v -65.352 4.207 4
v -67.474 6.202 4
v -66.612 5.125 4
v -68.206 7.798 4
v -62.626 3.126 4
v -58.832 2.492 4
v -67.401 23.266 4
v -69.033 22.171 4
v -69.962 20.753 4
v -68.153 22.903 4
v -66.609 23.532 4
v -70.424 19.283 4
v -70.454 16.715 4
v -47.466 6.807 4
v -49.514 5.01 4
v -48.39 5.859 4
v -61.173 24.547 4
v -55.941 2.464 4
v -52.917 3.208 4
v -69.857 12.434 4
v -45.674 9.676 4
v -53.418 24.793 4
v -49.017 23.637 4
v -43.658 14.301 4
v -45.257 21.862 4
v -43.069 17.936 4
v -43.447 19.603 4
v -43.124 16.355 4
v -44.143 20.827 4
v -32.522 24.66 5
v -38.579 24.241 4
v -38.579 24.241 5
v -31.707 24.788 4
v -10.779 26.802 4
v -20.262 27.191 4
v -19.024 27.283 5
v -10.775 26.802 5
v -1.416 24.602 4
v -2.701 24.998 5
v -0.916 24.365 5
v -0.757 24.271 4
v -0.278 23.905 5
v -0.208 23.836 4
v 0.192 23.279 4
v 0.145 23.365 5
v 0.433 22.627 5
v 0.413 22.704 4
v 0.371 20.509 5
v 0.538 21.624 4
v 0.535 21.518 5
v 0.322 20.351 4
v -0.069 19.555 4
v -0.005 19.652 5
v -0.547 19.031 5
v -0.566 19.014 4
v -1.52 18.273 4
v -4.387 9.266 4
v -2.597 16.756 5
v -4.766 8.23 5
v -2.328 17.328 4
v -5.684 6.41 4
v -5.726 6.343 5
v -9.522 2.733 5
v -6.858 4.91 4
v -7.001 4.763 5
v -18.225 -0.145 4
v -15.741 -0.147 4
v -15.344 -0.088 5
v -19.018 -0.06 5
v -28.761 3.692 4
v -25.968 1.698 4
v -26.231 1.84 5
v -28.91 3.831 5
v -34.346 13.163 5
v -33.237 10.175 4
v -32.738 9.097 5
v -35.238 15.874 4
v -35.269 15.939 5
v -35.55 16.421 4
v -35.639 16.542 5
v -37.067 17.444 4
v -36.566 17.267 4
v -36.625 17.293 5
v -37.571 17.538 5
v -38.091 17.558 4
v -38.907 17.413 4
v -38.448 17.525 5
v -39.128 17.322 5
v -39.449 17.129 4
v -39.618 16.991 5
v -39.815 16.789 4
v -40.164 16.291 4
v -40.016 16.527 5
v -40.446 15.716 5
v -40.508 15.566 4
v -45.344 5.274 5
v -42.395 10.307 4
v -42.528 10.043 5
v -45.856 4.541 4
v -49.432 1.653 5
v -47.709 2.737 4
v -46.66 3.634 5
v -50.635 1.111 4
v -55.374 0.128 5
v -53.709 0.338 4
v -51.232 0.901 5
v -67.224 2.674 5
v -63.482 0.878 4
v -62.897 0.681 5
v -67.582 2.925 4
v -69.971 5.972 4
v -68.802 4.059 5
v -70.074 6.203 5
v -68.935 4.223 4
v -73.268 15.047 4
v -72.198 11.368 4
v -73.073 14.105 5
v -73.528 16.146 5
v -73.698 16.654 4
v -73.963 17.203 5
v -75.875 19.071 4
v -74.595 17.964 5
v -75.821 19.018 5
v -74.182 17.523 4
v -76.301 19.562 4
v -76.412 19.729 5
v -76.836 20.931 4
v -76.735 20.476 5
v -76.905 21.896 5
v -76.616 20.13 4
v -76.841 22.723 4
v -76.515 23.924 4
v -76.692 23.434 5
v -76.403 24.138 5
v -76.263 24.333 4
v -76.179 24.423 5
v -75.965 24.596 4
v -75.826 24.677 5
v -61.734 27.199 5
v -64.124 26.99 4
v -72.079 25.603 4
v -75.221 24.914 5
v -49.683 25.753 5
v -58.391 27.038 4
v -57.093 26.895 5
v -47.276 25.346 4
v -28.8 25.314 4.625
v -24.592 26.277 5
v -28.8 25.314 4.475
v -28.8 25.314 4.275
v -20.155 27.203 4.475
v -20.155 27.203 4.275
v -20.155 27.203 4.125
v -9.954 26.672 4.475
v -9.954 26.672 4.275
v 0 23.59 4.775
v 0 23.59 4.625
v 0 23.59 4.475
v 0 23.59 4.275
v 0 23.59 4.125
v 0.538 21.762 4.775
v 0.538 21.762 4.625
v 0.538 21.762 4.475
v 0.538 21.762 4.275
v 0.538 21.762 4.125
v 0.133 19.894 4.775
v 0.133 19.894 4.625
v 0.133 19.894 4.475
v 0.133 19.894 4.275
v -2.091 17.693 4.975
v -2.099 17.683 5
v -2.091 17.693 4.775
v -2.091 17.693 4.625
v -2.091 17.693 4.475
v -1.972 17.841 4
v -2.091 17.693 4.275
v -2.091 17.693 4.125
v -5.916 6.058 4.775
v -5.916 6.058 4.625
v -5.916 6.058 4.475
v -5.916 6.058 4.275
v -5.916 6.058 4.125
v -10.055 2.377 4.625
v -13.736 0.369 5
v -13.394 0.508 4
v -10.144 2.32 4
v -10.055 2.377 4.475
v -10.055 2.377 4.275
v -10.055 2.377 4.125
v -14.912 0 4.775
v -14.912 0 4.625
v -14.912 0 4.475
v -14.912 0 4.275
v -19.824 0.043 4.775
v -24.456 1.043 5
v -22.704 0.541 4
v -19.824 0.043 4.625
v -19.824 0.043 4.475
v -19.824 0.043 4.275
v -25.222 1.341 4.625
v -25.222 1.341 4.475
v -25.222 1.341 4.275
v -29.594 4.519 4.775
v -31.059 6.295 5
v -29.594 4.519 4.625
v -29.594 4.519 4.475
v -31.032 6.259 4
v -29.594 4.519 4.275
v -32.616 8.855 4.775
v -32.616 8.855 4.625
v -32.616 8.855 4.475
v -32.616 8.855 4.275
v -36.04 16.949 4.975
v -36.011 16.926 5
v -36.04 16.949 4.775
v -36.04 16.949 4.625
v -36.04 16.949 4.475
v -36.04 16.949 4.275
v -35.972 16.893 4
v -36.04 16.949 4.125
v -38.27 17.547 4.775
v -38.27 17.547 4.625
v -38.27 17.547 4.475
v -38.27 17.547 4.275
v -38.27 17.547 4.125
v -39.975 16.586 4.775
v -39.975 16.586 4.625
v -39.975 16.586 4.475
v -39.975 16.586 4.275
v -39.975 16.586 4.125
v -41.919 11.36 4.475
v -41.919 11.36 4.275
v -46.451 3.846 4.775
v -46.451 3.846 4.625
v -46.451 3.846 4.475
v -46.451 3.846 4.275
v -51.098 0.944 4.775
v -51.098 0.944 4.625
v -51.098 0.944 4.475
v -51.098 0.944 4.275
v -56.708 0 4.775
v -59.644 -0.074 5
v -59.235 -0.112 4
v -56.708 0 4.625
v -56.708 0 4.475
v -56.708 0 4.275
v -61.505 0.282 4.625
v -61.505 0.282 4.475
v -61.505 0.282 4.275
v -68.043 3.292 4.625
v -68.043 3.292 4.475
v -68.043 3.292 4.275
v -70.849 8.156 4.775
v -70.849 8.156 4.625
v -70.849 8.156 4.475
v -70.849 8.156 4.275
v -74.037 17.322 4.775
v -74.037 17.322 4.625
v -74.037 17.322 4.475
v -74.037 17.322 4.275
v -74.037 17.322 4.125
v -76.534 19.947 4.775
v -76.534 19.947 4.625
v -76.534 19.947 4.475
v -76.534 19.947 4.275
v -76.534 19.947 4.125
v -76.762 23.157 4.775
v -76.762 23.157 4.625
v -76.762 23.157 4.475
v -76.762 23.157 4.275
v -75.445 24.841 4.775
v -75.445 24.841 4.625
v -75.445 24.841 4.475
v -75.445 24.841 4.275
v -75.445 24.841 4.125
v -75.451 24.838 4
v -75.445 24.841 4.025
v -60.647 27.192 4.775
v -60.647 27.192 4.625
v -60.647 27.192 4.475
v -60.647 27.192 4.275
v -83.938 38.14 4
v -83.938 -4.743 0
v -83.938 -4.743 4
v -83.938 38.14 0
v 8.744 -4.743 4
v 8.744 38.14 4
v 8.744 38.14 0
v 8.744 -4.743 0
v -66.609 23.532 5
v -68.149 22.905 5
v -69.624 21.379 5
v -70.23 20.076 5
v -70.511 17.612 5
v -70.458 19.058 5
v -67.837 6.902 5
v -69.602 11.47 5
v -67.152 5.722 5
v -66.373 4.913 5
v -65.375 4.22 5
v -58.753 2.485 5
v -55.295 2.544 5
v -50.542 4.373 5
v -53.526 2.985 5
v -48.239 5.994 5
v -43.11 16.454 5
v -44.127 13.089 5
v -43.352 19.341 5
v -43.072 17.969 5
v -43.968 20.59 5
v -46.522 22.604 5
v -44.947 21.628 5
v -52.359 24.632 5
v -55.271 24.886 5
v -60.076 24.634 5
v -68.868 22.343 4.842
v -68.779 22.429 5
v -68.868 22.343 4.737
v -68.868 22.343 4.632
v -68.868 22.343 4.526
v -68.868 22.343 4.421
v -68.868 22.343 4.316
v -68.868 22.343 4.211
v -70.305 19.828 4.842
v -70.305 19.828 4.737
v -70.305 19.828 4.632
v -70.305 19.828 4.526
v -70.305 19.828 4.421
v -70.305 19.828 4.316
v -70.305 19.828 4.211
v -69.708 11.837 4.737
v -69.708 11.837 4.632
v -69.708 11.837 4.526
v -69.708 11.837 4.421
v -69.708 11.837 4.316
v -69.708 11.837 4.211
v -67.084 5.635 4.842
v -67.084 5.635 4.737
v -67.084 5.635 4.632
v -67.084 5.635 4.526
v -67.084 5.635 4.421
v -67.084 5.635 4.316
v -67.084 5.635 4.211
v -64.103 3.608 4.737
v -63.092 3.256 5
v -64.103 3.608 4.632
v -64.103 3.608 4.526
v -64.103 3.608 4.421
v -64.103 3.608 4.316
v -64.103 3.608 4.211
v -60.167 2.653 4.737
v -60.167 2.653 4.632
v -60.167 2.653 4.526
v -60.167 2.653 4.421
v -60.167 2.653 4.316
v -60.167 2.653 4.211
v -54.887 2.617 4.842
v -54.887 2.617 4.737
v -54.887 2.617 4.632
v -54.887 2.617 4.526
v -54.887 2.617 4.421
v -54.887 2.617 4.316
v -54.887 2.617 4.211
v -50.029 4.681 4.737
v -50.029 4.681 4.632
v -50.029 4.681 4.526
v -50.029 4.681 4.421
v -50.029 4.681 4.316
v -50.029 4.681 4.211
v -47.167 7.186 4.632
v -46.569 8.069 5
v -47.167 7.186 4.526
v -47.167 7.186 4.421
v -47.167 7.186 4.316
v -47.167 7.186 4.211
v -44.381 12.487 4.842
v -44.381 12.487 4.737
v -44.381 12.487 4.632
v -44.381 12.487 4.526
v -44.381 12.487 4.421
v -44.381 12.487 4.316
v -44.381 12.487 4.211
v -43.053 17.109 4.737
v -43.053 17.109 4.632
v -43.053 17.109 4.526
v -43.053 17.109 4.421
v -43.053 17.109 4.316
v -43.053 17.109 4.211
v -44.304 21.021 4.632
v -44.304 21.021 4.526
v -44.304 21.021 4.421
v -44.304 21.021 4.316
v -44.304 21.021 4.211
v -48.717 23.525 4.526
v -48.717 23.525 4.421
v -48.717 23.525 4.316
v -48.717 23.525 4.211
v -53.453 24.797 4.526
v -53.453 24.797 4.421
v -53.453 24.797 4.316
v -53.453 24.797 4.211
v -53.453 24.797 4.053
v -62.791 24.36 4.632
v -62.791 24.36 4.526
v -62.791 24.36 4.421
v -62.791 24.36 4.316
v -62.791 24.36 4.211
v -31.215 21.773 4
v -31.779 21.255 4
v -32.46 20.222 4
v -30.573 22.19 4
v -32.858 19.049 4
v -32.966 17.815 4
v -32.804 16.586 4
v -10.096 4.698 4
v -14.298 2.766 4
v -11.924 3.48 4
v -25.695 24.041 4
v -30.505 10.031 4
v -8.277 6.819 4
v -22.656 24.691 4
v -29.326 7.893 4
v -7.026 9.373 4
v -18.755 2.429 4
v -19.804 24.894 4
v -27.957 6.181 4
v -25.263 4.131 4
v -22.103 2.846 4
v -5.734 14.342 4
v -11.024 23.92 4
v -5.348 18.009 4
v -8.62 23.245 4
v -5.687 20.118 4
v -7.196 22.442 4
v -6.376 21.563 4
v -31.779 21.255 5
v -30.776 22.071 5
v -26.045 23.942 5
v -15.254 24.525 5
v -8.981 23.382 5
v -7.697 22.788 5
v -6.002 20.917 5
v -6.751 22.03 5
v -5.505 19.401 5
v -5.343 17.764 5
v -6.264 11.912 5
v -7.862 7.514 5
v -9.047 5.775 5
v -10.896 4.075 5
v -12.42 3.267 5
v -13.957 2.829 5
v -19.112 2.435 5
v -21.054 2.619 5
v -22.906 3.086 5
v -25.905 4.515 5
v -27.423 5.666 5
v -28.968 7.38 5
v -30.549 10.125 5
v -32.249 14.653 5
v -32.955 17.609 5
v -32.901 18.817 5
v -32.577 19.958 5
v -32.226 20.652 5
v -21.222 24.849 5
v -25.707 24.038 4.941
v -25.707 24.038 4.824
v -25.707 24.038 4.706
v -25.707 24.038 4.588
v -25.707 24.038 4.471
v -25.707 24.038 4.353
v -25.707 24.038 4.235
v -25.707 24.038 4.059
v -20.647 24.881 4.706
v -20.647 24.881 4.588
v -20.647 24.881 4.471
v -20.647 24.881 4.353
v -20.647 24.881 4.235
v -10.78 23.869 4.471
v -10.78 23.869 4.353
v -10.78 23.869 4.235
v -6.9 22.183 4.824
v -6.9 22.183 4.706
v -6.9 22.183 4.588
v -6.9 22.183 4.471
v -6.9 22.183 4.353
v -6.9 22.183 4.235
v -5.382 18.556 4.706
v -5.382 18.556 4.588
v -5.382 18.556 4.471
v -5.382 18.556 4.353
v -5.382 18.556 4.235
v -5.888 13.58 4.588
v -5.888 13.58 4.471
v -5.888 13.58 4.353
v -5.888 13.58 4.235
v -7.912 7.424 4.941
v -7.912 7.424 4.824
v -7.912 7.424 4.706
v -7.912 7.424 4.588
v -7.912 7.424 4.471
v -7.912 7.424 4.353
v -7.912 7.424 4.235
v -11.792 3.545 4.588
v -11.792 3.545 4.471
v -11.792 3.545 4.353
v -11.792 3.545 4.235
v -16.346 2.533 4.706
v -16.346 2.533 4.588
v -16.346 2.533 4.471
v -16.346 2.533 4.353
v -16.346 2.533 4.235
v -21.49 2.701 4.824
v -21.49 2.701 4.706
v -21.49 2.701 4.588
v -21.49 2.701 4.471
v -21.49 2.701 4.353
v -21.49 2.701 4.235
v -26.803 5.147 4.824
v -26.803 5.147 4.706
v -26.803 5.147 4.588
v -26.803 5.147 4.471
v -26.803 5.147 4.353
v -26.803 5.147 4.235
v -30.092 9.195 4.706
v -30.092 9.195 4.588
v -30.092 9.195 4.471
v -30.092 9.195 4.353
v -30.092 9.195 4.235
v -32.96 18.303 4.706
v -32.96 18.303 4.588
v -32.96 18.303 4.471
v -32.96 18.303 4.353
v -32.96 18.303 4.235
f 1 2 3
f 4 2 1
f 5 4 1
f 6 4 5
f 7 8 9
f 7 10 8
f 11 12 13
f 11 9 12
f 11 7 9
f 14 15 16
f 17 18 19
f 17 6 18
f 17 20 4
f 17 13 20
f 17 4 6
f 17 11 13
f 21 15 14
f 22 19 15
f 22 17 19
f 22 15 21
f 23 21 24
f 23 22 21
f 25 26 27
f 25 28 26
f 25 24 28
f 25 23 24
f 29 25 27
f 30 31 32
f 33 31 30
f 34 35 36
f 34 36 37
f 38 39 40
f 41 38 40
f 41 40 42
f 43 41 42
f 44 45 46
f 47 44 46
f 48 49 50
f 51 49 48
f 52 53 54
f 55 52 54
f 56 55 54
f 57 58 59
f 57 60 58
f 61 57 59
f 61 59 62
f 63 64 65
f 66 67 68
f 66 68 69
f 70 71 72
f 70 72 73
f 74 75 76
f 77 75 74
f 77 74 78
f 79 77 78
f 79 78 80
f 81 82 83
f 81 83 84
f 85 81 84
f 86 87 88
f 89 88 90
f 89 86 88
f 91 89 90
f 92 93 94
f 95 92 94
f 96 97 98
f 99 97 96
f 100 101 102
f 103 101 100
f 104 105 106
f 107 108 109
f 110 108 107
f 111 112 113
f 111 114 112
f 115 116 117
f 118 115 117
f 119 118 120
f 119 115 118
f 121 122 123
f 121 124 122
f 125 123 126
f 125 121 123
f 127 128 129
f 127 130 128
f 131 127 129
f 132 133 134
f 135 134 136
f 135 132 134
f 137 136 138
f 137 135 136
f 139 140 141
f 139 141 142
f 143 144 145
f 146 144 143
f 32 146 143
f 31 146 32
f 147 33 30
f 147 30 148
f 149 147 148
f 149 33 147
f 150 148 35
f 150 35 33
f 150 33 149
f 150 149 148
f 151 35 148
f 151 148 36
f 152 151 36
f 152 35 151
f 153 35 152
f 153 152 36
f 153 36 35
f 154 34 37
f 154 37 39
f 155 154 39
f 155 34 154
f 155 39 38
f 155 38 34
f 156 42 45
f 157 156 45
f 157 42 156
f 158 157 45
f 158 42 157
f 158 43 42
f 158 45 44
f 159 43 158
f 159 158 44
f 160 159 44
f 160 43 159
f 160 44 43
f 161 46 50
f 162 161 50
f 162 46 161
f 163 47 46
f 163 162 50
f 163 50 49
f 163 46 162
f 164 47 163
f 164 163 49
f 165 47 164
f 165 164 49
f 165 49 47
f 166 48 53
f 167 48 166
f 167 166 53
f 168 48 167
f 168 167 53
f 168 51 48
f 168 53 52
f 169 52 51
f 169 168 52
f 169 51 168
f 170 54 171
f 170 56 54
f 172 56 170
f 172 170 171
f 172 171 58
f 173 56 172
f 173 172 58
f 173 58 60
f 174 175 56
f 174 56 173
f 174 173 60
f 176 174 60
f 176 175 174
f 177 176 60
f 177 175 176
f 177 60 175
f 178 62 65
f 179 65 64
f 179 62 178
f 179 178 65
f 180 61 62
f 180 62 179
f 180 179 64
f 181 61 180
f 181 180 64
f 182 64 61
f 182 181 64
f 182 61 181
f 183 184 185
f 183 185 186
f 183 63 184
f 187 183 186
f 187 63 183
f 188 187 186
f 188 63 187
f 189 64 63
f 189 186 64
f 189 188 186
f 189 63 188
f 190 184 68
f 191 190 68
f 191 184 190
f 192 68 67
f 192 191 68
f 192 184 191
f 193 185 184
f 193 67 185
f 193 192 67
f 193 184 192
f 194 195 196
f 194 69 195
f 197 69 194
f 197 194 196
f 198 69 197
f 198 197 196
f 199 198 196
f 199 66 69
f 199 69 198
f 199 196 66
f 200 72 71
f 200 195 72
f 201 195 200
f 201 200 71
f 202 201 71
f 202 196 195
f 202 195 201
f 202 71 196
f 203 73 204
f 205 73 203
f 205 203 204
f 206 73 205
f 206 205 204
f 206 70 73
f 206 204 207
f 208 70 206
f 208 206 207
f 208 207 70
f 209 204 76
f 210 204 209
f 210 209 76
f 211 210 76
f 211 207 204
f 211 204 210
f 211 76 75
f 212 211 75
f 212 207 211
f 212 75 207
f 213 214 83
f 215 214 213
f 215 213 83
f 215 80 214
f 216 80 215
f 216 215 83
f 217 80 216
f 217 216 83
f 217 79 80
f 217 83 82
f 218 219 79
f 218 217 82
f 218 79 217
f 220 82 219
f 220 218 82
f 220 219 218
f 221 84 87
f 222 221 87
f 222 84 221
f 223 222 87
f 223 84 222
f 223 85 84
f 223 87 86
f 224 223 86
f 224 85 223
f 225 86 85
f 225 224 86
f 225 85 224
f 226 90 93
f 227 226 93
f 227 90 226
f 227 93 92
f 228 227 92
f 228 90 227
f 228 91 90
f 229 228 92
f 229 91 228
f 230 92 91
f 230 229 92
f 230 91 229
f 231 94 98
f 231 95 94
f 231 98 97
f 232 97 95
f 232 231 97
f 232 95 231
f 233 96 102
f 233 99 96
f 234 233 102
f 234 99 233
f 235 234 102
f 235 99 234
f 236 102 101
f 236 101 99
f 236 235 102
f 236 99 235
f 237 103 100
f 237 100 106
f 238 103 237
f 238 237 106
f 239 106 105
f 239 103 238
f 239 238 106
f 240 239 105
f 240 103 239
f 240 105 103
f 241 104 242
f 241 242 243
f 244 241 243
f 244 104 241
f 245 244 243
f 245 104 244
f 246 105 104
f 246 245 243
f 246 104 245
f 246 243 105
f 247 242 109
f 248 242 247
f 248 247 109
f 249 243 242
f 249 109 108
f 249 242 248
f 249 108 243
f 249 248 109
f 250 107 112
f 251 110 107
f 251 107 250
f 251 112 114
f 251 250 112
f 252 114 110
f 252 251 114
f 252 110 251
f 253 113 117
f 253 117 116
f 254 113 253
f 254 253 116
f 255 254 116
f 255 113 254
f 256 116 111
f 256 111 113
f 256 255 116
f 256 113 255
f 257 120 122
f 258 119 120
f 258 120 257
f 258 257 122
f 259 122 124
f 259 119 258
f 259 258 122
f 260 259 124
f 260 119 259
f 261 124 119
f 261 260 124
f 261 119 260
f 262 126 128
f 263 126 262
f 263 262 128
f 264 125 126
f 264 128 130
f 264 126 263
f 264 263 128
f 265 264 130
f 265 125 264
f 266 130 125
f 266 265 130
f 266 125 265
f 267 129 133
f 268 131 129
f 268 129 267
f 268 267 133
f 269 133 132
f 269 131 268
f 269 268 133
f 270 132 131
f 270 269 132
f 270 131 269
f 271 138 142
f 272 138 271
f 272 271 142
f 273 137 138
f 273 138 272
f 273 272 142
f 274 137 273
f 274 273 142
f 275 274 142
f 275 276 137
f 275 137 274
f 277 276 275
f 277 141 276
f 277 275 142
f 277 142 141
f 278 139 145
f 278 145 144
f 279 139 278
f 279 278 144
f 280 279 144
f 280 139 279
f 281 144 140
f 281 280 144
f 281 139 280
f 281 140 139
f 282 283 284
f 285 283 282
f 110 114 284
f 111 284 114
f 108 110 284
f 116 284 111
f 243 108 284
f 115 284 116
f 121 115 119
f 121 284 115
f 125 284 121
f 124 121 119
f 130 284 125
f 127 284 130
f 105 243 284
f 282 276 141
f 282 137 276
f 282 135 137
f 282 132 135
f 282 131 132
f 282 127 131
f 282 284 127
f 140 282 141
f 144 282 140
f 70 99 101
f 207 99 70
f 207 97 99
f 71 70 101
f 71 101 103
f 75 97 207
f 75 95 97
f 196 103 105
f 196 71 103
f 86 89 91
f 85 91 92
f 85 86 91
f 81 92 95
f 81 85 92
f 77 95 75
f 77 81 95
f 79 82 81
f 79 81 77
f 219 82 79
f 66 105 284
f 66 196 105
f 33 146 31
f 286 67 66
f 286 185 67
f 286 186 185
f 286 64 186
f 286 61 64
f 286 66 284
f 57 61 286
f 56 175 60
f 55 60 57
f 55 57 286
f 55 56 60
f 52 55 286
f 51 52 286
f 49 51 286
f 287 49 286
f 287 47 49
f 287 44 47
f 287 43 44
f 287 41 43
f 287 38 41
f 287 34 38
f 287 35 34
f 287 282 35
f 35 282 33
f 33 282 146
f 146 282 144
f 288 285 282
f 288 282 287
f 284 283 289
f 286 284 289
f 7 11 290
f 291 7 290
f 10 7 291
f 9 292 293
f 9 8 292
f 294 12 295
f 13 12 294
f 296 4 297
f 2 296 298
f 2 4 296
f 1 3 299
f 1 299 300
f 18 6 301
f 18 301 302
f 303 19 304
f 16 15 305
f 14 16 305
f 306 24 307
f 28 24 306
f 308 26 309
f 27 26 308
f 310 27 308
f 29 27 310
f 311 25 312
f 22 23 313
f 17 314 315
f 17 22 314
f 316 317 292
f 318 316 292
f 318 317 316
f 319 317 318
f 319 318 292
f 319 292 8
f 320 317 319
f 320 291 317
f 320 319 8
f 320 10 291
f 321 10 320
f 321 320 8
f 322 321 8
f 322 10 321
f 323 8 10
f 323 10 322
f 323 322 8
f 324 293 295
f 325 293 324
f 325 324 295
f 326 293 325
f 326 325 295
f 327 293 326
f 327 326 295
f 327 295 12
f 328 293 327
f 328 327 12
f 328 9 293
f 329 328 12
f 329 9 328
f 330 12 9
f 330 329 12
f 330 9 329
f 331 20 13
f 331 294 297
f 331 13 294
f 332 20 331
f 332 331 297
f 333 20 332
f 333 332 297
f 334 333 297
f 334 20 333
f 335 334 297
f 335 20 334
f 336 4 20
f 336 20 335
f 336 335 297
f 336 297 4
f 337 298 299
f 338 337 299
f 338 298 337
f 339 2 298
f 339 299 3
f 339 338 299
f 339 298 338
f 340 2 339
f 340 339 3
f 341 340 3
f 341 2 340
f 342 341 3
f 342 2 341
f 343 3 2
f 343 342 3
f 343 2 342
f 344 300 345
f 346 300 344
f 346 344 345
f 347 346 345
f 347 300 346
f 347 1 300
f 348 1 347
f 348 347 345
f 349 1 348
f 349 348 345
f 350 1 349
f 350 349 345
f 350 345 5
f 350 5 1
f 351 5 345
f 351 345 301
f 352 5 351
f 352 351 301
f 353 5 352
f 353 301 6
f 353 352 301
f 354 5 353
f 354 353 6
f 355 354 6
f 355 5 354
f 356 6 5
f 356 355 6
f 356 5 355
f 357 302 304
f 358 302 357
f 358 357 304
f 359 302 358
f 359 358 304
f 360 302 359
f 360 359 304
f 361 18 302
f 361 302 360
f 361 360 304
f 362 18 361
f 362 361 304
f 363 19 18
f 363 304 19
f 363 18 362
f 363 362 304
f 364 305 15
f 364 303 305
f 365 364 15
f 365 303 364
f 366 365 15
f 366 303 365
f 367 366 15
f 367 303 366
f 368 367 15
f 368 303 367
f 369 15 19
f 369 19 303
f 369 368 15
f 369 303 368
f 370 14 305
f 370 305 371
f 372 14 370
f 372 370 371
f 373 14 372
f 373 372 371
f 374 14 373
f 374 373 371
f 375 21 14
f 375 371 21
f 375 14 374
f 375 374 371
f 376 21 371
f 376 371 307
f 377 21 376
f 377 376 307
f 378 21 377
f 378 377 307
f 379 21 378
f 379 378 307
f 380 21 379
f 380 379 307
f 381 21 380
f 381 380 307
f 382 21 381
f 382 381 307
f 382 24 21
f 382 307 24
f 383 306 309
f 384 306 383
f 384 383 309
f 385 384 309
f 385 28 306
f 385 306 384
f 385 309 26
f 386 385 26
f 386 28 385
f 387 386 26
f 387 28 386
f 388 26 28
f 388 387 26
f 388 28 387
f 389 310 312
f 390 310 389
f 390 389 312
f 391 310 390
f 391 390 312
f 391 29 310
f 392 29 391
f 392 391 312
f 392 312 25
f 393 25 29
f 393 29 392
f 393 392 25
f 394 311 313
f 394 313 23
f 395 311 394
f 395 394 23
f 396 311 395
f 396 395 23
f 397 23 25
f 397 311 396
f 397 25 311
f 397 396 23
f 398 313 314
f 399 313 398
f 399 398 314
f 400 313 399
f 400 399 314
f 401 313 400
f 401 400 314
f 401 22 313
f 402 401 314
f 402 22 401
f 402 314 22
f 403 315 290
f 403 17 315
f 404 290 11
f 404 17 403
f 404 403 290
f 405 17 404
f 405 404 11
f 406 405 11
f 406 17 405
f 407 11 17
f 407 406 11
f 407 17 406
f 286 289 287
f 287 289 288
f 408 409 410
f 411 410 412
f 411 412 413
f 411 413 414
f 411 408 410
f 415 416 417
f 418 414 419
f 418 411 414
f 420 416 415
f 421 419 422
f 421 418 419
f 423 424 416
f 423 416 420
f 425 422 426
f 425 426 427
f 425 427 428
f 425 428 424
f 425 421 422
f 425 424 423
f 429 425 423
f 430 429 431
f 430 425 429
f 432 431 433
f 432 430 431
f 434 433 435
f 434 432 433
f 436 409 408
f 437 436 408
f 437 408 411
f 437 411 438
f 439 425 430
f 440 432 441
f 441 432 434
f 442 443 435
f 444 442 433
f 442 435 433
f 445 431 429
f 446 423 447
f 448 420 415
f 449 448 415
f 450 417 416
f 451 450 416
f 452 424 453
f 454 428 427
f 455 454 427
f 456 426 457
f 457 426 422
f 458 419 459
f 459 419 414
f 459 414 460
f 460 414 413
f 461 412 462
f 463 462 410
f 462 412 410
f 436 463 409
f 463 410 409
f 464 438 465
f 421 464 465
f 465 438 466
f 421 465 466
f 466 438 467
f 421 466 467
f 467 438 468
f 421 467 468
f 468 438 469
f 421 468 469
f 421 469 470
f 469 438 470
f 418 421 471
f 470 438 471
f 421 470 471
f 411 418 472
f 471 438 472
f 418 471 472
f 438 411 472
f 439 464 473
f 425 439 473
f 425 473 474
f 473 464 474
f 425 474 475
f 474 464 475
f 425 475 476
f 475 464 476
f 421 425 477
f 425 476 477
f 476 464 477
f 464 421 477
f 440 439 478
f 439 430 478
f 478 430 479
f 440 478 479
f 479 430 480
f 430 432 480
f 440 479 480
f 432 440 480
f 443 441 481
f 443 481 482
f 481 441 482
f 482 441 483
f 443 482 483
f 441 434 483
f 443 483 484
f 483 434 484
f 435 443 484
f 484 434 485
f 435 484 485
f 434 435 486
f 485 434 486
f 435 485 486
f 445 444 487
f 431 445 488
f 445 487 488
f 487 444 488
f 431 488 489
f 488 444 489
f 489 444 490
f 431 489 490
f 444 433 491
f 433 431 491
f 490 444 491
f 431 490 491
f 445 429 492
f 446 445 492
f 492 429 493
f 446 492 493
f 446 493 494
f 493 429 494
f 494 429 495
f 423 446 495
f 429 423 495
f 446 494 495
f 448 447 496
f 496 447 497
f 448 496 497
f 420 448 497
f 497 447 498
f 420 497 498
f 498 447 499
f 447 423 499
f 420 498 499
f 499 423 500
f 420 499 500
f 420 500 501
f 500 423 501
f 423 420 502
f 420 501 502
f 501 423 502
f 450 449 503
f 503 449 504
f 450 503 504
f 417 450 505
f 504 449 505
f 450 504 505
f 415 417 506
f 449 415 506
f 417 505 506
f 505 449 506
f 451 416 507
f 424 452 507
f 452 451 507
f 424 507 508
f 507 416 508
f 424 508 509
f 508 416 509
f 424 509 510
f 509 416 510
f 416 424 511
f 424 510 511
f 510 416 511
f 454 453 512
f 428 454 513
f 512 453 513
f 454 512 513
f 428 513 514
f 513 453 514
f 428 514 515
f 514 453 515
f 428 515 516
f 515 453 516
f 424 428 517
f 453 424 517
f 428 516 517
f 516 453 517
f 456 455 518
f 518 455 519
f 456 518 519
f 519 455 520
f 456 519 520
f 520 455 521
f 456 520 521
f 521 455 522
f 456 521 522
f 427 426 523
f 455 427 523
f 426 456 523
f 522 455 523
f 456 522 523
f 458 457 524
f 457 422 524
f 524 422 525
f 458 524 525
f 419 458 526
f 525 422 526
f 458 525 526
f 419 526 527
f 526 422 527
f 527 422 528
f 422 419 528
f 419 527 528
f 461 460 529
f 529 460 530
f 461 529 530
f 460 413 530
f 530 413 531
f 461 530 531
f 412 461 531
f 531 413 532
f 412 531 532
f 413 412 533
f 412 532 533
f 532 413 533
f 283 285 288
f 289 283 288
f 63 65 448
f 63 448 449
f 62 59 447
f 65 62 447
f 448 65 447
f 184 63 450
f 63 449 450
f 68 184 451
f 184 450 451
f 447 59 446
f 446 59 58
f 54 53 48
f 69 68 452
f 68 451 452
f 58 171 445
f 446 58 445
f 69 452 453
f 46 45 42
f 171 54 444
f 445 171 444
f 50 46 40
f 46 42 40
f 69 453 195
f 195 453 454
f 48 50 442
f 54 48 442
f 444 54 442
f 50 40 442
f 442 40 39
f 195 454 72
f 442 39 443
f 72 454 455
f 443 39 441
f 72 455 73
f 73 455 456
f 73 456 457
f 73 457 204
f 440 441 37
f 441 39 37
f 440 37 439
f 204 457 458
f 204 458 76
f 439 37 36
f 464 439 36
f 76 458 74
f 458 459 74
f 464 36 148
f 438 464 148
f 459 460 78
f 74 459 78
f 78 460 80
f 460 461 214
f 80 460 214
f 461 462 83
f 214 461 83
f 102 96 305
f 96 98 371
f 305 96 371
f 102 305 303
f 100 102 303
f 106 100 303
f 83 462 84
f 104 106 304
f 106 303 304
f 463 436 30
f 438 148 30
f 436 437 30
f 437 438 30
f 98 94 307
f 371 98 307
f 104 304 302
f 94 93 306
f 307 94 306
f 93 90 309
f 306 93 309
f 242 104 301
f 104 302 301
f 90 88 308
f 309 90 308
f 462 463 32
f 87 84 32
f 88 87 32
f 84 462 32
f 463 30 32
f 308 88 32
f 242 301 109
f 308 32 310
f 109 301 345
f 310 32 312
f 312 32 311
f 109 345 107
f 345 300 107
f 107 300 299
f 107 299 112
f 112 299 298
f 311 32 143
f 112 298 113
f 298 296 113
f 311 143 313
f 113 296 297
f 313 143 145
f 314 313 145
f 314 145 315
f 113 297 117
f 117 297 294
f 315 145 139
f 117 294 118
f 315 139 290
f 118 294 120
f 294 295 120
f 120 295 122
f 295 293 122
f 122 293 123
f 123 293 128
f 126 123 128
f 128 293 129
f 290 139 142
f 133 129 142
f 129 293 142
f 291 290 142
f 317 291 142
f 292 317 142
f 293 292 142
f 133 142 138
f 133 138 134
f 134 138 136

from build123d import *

# Parameters (mm, degrees)
F1_DEPTH = 5
F2_W     = 92.6819341257
F2_H     = 42.8826878779
F3_DEPTH = 4


with BuildPart() as f1:
    # F0 (on Top) → F1 (new body)
    with BuildSketch(Plane.XY):
        with BuildLine():
            add(Edge.make_bspline(
                [(-38.5794527829, 24.2407601327), (-36.8938359657, 24.1646889377), (-34.0712271397, 24.3701397917), (-28.7449336503, 25.2725649481), (-24.6964236408, 26.233170797), (-20.0937351066, 27.4374504094), (-15.9388121782, 27.1907800467), (-9.7784106854, 26.9215230295), (-5.1572212989, 25.2878939395), (0.9454413275, 24.6197493885), (0.5284380254, 19.1125949977), (-2.7772947075, 18.1134582068), (-3.4772585982, 11.9771551568), (-5.3535759298, 5.7153961302), (-9.9969087832, 2.2895875239), (-14.8227365622, -0.4988788856), (-19.5141472301, -0.0528227384), (-25.434546306, 0.8846617395), (-29.8347389018, 4.3816497471), (-32.7929461918, 8.7179524801), (-34.5677049198, 13.5628935911), (-35.4518550311, 17.3758928026), (-39.0381090092, 17.8289636328), (-40.6751139591, 15.8870554399), (-41.6076919366, 11.1768105438), (-44.5948251246, 6.6107335821), (-46.2072444153, 3.6459383205), (-50.8057943554, 0.4598349112), (-56.8431956147, 0.0313466232), (-60.0548137757, -0.4130011603), (-69.0276406889, 2.5740187249), (-70.6345398481, 8.0783303504), (-73.2337788323, 13.2783723041), (-73.4712085199, 17.7973904612), (-77.2733596066, 19.3870364009), (-76.8231832018, 24.2080677076), (-75.0488474945, 25.1841828262), (-66.5877341579, 26.487686587), (-61.5692334882, 27.5991577961), (-52.5676144362, 26.2811993145), (-45.8588823668, 25.0671448707), (-40.6686330251, 24.3350439793), (-38.5794527829, 24.2407601327)],
                knots=[0, 0, 0, 0, 0.0241474843, 0.0498897382, 0.073155029, 0.0971827474, 0.1203224345, 0.1478351024, 0.1736566374, 0.1992127659, 0.221505345, 0.2405525489, 0.2673594014, 0.2961833033, 0.3228074342, 0.3487846126, 0.3728578694, 0.4001206074, 0.426398869, 0.4521044299, 0.4778633525, 0.4990299956, 0.5179160719, 0.5345645452, 0.5591712716, 0.5854055844, 0.6059579933, 0.6319885323, 0.6590857553, 0.6799952881, 0.7128440696, 0.7393418837, 0.7664241679, 0.7892244711, 0.8101907416, 0.8324957432, 0.8477570402, 0.8798625069, 0.9067446437, 0.9397884446, 0.9700712246, 1, 1, 1, 1], degree=3))
        make_face()
        with BuildLine():
            add(Edge.make_bspline(
                [(-66.6092485189, 23.5319379717), (-67.4761459535, 23.2743972607), (-68.9089194071, 22.7035505917), (-70.6580452843, 19.788604104), (-70.4680350186, 16.3653713859), (-69.911797862, 11.7675728026), (-68.4677341297, 8.7023053291), (-67.4196852434, 5.3639826527), (-64.0844675017, 3.3663977702), (-60.1474924991, 2.5592913516), (-54.8208538912, 2.1012659041), (-49.9218780566, 4.5852766382), (-46.8886891471, 6.9316046041), (-44.3056551544, 12.5032192651), (-42.5950564538, 16.9435696955), (-43.7746657721, 21.562893885), (-48.8198971089, 23.6192863678), (-53.3162741575, 25.1387621952), (-58.961939921, 24.6948398011), (-62.6698175214, 24.4805997736), (-65.5034649161, 23.860447763), (-66.6092485189, 23.5319379717)],
                knots=[0, 0, 0, 0, 0.0398924743, 0.0848335033, 0.1327232656, 0.1878649696, 0.2355687995, 0.2823850067, 0.3312672951, 0.3830723168, 0.442225693, 0.5013664008, 0.5515711662, 0.6145674966, 0.6710206065, 0.7231916265, 0.781179122, 0.8381843985, 0.8984597376, 0.9491145755, 1, 1, 1, 1], degree=3))
        make_face(mode=Mode.SUBTRACT)
        with BuildLine():
            add(Edge.make_bspline(
                [(-31.7790433764, 21.2549027056), (-31.1352528122, 21.9736944803), (-29.280476361, 22.8483230083), (-25.6703564873, 24.1710988323), (-20.6282420244, 25.1606047265), (-15.4271239564, 24.537132683), (-10.8687049858, 24.0344262508), (-6.450988844, 22.6791600578), (-4.9910545683, 18.4292115555), (-5.8295398098, 13.5230801073), (-7.3741047676, 7.2188627173), (-11.5288468292, 3.0297945275), (-16.3836291345, 2.468297857), (-21.5544379242, 2.2598627037), (-27.1289275074, 4.820878216), (-30.3301621747, 9.0043067098), (-32.1996654778, 14.432855173), (-33.3749286044, 18.183681145), (-32.4556118871, 20.4995143736), (-31.7790433764, 21.2549027056)],
                knots=[0, 0, 0, 0, 0.0460897108, 0.0993280782, 0.1608561053, 0.2230387712, 0.2818522689, 0.3377250388, 0.3915876586, 0.4523403658, 0.5214959951, 0.5851255575, 0.6438005318, 0.7054322314, 0.7711312371, 0.8331724625, 0.8981211383, 0.9515636781, 1, 1, 1, 1], degree=3))
        make_face(mode=Mode.SUBTRACT)
    extrude(amount=F1_DEPTH)

    # F2 (on Top) → F3 (join)
    with BuildSketch(Plane.XY):
        with Locations((-37.5968418084, 16.6985581163)):
            Rectangle(F2_W, F2_H)
    extrude(amount=F3_DEPTH)


solid = f1.part
